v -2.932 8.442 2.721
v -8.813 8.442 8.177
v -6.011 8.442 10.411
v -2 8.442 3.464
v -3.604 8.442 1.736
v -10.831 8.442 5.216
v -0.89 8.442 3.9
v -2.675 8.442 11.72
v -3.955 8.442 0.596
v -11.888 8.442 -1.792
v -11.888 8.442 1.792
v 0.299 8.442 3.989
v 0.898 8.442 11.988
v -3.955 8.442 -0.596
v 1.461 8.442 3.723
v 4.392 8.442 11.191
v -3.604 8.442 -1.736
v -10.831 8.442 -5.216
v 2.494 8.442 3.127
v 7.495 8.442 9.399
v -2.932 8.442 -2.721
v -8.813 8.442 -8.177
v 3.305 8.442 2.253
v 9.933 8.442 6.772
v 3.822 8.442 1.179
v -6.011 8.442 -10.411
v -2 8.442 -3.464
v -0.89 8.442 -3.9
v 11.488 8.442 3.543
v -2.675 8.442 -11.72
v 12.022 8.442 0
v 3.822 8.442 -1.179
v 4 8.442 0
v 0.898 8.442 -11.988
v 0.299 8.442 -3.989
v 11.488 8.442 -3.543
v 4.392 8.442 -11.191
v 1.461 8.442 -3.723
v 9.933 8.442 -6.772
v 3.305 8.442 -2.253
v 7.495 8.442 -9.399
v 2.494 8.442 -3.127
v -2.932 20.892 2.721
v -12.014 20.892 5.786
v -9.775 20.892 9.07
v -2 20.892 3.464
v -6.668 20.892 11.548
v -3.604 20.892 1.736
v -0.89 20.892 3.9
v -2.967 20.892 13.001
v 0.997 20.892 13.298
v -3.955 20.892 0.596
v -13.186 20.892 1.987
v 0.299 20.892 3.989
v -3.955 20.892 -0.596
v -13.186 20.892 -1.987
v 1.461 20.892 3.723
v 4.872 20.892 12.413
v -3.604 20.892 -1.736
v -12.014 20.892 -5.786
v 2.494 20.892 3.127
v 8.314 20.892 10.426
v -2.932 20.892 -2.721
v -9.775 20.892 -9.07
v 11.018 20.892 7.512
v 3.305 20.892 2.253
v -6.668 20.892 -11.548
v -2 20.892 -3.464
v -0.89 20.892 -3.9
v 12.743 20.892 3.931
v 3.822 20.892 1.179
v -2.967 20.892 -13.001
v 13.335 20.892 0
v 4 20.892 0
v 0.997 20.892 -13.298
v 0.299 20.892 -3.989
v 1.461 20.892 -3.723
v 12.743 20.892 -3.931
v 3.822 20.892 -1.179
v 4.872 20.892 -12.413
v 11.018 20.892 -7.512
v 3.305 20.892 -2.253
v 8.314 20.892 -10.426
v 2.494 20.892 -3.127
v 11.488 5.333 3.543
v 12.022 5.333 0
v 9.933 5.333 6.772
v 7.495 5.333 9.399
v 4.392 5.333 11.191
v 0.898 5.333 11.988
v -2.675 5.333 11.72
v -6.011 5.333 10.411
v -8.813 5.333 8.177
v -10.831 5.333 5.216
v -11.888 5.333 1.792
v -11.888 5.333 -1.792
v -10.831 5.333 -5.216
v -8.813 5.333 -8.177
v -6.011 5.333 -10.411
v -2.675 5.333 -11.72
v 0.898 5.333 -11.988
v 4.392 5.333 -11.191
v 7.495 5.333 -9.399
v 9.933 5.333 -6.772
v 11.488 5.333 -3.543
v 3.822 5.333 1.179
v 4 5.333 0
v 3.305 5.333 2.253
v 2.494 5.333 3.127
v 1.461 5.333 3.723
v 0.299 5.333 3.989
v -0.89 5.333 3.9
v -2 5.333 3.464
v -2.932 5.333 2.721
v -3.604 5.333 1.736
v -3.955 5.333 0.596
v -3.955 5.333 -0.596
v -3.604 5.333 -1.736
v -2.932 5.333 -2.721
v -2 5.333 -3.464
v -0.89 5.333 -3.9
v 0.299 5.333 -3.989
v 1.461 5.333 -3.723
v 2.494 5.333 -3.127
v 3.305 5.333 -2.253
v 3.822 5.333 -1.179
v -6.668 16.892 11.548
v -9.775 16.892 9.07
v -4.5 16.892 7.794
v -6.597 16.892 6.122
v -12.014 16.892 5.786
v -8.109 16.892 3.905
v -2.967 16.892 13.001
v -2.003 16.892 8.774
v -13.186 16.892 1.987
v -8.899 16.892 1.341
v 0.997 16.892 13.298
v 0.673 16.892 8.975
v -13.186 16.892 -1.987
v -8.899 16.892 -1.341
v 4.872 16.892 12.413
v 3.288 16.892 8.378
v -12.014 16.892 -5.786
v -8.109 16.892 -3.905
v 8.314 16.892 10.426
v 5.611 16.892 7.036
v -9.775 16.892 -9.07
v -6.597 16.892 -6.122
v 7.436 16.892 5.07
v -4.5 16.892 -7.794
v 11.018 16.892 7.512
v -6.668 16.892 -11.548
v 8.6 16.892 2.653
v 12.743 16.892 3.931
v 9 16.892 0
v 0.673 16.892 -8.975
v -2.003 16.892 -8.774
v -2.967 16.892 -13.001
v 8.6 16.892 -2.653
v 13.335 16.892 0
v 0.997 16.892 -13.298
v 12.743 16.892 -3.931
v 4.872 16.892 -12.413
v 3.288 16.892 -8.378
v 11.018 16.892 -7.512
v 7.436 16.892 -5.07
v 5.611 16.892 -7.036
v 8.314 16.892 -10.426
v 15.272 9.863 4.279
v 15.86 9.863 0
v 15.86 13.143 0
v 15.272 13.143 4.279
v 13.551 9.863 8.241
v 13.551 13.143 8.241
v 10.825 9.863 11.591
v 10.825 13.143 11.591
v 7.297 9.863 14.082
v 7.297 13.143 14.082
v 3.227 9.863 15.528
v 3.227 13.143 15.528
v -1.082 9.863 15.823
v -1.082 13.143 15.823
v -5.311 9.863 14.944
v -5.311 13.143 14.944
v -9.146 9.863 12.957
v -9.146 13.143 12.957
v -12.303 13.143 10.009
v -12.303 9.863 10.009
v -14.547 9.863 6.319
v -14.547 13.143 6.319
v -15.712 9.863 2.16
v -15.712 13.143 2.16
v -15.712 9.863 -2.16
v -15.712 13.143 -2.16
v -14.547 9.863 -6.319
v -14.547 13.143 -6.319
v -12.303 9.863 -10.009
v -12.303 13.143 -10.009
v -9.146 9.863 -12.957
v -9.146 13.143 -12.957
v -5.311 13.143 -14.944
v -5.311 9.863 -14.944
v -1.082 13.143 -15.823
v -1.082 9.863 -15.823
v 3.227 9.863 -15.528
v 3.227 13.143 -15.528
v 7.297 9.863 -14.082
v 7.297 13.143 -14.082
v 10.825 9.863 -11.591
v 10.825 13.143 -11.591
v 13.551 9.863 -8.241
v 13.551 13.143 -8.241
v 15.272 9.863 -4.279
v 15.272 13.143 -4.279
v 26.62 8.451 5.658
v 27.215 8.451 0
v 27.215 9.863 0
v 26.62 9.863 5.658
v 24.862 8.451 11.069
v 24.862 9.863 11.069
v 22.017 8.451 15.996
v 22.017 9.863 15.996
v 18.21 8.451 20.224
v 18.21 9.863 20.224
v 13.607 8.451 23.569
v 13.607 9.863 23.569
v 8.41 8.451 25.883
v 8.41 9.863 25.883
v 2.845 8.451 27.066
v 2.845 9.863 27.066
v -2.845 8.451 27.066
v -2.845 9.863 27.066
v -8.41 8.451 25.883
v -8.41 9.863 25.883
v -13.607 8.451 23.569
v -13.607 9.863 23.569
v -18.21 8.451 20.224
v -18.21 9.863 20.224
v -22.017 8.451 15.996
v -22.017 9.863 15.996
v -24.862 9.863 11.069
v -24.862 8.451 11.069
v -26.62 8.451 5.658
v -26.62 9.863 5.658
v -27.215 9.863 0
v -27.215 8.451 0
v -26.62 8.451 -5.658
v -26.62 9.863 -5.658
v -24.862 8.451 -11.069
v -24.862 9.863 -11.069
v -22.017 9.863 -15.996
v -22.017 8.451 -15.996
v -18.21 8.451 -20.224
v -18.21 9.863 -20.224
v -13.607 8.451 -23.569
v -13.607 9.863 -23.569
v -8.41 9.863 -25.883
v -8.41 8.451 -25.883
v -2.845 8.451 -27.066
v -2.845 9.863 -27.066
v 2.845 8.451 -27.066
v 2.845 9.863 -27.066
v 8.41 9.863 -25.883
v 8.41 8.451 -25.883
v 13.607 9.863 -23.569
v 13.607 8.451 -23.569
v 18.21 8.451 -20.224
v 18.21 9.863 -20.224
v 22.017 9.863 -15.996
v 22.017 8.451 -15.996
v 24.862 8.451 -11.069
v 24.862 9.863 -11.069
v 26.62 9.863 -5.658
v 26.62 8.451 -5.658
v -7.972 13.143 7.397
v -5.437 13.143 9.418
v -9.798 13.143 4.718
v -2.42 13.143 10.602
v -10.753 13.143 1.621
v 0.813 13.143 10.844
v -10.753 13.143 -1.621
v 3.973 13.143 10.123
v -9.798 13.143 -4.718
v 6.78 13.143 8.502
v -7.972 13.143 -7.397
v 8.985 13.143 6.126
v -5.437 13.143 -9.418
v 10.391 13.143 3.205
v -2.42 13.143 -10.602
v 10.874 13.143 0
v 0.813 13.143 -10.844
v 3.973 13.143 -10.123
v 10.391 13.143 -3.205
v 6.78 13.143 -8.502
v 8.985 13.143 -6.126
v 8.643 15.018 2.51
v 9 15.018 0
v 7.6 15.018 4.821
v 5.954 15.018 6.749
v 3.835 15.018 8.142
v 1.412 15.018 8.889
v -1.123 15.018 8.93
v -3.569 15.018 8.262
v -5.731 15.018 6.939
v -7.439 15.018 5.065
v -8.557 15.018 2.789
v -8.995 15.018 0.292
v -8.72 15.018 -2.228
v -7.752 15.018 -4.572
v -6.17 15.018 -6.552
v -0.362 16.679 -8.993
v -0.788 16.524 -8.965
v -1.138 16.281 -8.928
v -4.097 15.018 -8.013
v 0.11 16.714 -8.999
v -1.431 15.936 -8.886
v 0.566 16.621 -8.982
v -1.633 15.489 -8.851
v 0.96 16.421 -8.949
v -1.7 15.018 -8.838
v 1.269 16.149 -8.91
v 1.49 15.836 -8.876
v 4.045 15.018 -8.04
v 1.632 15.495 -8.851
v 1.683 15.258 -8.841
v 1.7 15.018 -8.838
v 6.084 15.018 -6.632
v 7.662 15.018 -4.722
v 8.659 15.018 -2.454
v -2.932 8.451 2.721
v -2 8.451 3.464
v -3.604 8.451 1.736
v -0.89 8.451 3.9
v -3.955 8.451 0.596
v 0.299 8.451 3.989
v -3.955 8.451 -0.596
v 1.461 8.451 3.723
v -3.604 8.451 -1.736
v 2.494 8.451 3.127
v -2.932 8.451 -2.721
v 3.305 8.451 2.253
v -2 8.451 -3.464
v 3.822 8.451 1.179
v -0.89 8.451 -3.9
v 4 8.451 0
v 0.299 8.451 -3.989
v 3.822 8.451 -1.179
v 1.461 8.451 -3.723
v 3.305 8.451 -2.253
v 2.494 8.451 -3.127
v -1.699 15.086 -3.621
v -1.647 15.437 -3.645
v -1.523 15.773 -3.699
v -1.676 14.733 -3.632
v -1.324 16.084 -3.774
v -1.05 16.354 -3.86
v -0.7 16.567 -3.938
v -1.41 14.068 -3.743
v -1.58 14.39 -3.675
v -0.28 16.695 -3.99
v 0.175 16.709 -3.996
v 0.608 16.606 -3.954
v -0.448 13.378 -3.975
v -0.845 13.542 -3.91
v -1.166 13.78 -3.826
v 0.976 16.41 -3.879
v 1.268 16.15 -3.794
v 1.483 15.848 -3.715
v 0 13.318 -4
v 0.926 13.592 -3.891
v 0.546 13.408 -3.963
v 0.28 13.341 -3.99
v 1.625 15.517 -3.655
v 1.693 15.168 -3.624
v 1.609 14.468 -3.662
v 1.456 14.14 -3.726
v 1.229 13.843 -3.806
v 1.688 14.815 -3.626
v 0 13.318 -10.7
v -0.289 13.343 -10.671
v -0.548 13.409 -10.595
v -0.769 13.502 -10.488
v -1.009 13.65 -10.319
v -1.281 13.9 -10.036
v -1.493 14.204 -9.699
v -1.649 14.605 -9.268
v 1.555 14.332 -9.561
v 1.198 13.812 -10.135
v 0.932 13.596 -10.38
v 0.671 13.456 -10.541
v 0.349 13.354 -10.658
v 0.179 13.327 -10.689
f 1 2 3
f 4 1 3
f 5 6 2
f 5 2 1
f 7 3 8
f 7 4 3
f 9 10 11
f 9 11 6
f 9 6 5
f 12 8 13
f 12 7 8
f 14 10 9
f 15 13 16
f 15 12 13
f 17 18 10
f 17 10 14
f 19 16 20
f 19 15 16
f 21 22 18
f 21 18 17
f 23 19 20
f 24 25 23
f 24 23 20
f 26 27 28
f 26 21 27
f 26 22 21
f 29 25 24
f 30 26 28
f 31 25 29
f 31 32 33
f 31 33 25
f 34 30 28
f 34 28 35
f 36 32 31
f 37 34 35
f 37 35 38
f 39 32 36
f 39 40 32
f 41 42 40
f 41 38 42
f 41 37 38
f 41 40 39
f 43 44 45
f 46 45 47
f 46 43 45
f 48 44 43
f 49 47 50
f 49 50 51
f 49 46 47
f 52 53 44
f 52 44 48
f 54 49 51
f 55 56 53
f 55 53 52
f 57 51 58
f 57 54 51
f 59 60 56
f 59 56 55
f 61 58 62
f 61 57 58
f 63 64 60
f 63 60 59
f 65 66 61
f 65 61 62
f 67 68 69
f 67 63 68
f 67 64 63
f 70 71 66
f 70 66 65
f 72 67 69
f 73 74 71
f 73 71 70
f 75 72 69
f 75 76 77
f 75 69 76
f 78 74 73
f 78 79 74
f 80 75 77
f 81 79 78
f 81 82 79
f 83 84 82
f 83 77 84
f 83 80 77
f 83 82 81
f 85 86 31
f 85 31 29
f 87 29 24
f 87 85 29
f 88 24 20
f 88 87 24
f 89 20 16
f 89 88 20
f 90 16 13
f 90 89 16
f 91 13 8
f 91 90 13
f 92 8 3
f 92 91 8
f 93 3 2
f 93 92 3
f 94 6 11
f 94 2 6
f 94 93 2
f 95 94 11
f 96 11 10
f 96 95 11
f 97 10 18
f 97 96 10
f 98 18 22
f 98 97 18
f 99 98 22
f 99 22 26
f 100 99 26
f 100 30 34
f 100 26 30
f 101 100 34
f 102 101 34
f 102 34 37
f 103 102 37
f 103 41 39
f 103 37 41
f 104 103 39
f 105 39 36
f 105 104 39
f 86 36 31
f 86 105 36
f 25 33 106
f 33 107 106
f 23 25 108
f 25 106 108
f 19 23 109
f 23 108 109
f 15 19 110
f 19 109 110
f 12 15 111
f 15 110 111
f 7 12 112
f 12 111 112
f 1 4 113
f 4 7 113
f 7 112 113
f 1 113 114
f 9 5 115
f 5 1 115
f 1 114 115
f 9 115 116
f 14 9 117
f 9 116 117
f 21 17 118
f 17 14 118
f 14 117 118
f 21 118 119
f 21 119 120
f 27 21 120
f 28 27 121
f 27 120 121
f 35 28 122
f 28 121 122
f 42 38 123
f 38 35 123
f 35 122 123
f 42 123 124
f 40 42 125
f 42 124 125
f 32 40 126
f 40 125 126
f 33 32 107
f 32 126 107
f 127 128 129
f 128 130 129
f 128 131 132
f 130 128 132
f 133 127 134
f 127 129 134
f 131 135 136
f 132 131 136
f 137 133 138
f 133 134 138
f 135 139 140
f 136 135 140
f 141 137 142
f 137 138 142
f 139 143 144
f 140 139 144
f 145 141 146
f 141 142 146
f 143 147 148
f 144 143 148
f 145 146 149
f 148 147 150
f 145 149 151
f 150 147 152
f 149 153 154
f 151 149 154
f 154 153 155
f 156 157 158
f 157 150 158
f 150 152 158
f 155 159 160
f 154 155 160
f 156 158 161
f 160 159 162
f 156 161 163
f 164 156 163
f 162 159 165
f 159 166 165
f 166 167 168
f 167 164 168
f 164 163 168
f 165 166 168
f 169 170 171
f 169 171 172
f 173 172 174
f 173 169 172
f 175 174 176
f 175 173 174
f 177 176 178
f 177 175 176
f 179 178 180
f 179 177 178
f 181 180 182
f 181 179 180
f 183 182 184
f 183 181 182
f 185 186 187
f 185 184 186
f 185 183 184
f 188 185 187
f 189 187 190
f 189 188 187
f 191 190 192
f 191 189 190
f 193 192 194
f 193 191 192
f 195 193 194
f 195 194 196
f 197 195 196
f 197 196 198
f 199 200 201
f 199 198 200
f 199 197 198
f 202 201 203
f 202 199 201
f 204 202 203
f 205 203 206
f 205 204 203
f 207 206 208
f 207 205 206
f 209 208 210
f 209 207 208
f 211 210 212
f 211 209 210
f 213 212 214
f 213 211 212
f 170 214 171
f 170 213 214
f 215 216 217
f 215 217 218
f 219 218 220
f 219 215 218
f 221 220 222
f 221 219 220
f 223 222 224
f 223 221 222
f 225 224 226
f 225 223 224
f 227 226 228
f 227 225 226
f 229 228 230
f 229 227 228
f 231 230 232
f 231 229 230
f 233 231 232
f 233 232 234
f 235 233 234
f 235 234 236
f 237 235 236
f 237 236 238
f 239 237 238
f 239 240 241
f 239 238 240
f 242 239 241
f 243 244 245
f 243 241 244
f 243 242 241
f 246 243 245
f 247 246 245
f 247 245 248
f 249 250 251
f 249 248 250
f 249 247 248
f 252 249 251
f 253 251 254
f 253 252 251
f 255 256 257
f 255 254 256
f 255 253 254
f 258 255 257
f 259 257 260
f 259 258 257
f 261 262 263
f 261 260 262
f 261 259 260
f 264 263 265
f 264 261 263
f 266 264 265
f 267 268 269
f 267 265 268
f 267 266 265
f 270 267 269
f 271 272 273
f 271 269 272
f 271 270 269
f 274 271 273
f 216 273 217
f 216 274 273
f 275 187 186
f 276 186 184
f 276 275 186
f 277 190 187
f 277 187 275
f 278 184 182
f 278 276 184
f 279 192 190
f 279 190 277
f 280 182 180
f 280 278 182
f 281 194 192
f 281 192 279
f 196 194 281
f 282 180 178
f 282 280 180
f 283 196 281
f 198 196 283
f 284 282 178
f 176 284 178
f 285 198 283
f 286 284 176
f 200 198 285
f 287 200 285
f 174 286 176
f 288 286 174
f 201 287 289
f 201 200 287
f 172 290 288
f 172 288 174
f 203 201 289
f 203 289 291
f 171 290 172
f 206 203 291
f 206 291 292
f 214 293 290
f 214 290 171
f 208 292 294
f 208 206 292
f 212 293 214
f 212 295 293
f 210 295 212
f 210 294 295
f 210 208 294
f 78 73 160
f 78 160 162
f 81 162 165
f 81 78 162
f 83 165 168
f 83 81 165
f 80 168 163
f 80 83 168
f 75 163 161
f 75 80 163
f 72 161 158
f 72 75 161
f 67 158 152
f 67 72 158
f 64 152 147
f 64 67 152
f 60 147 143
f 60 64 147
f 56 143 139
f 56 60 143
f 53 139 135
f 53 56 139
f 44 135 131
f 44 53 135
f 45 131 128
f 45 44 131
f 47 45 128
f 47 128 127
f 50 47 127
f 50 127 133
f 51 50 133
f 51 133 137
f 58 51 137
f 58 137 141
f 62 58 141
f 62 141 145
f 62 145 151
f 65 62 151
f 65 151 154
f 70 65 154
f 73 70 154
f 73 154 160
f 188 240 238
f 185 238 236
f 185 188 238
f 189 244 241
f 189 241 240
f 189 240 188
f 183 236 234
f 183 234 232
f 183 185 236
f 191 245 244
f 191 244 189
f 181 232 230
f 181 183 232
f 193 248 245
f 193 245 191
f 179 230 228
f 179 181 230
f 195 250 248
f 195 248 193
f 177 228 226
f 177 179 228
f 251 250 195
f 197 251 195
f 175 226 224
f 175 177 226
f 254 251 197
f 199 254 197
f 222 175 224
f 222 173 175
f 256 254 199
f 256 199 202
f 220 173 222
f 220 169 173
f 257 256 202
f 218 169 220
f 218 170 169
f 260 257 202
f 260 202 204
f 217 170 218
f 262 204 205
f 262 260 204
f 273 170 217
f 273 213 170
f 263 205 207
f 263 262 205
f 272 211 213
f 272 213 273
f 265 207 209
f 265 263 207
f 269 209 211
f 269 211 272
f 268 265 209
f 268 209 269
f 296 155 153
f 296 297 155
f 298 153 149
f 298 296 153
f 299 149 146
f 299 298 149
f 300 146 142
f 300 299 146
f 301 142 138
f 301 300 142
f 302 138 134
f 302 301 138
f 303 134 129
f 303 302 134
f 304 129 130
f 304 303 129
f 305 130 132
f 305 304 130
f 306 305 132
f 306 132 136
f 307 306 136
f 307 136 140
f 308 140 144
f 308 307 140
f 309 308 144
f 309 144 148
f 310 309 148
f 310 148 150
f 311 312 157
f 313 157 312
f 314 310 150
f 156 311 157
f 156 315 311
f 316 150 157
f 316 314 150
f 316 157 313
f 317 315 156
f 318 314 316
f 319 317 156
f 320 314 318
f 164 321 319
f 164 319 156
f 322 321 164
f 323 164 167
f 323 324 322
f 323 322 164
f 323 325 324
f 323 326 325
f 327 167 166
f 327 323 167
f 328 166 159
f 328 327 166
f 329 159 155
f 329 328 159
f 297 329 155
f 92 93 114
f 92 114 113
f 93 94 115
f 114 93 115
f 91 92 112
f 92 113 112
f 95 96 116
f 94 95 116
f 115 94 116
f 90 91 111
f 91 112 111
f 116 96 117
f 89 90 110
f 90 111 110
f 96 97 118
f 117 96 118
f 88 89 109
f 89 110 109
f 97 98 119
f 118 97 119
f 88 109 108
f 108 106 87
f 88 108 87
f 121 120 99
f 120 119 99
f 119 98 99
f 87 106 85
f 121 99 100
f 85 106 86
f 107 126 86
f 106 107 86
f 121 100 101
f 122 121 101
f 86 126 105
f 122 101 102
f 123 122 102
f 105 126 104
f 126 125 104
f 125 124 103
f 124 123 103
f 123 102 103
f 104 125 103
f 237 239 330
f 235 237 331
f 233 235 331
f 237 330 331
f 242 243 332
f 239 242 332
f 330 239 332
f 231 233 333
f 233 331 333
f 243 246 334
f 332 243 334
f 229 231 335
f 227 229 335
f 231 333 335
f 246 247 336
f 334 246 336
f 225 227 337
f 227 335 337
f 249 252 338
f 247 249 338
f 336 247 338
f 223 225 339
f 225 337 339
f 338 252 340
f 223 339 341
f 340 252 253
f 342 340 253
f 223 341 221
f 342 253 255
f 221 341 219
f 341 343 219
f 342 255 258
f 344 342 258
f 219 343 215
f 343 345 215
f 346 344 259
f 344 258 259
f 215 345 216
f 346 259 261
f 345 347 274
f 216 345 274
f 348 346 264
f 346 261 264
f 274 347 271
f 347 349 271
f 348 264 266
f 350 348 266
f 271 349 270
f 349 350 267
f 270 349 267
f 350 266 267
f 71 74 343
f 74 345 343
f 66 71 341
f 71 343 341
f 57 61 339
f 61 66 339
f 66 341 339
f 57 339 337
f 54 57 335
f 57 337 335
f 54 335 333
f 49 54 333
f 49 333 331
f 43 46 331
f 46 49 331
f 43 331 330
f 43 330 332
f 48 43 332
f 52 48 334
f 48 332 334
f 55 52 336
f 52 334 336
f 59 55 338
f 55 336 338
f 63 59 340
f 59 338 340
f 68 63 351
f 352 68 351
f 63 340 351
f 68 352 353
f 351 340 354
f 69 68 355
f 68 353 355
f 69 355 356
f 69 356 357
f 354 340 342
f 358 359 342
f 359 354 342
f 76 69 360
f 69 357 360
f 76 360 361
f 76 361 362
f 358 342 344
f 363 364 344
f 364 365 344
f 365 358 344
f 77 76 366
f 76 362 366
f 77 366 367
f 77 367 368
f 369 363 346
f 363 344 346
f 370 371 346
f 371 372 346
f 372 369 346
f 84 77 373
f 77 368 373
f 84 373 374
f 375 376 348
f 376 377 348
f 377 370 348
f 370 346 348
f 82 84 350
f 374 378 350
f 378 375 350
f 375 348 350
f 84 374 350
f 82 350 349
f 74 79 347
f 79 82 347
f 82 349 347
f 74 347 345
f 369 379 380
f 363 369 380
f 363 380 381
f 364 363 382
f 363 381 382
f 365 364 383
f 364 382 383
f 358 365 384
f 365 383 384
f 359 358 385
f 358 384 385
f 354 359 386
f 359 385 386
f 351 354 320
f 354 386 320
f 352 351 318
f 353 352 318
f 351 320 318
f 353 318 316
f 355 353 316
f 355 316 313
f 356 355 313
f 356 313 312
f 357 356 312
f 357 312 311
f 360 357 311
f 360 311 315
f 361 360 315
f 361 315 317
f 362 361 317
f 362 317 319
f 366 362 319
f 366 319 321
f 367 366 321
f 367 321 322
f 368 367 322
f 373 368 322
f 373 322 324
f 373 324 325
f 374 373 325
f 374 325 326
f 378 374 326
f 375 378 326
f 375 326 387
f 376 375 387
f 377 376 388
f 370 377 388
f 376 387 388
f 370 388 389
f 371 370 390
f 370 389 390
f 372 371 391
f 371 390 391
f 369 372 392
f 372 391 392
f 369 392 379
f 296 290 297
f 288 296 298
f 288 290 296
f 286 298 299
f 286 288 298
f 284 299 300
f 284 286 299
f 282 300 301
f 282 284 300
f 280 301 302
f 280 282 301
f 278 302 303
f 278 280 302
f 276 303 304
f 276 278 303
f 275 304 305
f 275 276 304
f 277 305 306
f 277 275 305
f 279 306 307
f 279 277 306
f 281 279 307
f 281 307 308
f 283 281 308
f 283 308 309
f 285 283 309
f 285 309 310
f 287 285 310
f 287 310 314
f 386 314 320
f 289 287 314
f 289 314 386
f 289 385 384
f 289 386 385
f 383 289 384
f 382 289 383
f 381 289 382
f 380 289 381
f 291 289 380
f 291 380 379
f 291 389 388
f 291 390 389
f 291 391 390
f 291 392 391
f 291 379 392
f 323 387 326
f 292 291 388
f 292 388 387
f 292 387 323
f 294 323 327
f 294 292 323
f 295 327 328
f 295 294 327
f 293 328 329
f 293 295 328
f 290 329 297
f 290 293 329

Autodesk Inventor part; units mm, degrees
ref_plane "YZ Plane" through (0, 0, 0) normal (1, 0, 0) x (0, 1, 0)
ref_plane "XZ Plane" through (0, 0, 0) normal (0, 1, 0) x (-1, 0, 0)
ref_plane "XY Plane" through (0, 0, 0) normal (0, 0, 1) x (1, 0, 0)
sketch "Sketch2" plane through (0, 0, 0) normal (0, 0, 1) x (1, 0, 0)
  line L0 (-13.335, 16.8924) -> (13.335, 16.8924) construction
  line L1 (13.335, 16.8924) -> (13.335, 20.8924)
  line L2 (13.335, 20.8924) -> (-13.335, 20.8924) construction
  line L3 (-13.335, 20.8924) -> (-13.335, 16.8924)
  line L4 (-13.335, 16.8924) -> (13.335, 20.8924) construction
  line L5 (13.335, 16.8924) -> (-13.335, 20.8924) construction
  line L6 (0, -12.1762) -> (0, 12.1762) construction
  line L7 (-9, 16.8924) -> (9, 16.8924) construction
  line L8 (9, 16.8924) -> (9, 20.8924)
  line L9 (9, 20.8924) -> (-9, 20.8924) construction
  line L10 (-9, 20.8924) -> (-9, 16.8924)
  line L11 (-9, 16.8924) -> (9, 20.8924) construction
  line L12 (9, 16.8924) -> (-9, 20.8924) construction
  line L13 (31.2915, 53.5117) -> (31.2915, -42.8656) construction
  line L14 (31.2915, -42.8656) -> (-90.5187, -42.8656) construction
  line L15 (-90.5187, -42.8656) -> (-90.5187, 53.5117) construction
  line L16 (-90.5187, 53.5117) -> (31.2915, 53.5117) construction
  line L17 (15.8601, 8.4424) -> (-15.8601, 8.4424)
  line L18 (-15.8601, 8.4424) -> (-15.8601, 13.1433)
  line L19 (-15.8601, 13.1433) -> (15.8601, 13.1433)
  line L20 (15.8601, 13.1433) -> (15.8601, 8.4424)
  line L21 (15.8601, 8.4424) -> (-15.8601, 13.1433) construction
  line L22 (-15.8601, 8.4424) -> (15.8601, 13.1433) construction
  line L23 (27.2146, 8.4512) -> (-27.2146, 8.4512)
  line L24 (-27.2146, 8.4512) -> (-27.2146, 9.8628)
  line L25 (-27.2146, 9.8628) -> (27.2146, 9.8628)
  line L26 (27.2146, 9.8628) -> (27.2146, 8.4512)
  line L27 (27.2146, 8.4512) -> (-27.2146, 9.8628) construction
  line L28 (-27.2146, 8.4512) -> (27.2146, 9.8628) construction
  line L29 (12.0218, 5.3333) -> (-12.0218, 5.3333)
  line L30 (-12.0218, 5.3333) -> (-12.0218, 8.8452)
  line L31 (-12.0218, 8.8452) -> (12.0218, 8.8452)
  line L32 (12.0218, 8.8452) -> (12.0218, 5.3333)
  line L33 (12.0218, 5.3333) -> (-12.0218, 8.8452) construction
  line L34 (-12.0218, 5.3333) -> (12.0218, 8.8452) construction
  line L35 (-9, 16.8924) -> (-9, 13.1433)
  line L36 (-9, 15.0178) -> (-10.8745, 13.1433)
  line L37 (9, 16.8924) -> (9, 13.1433)
  line L38 (9, 15.0178) -> (10.8745, 13.1433)
  line L39 (-13.335, 20.8924) -> (13.335, 20.8924)
  line L40 (4, 3.8577) -> (-4, 3.8577) construction
  line L41 (-4, 3.8577) -> (-4, 22.4289)
  line L42 (-4, 22.4289) -> (4, 22.4289) construction
  line L43 (4, 22.4289) -> (4, 3.8577)
  line L44 (4, 3.8577) -> (-4, 22.4289) construction
  line L45 (-4, 3.8577) -> (4, 22.4289) construction
  line L46 (-13.335, 16.8924) -> (13.335, 16.8924)
  point P0 (0, 0)
  point P1 (0, 18.8924)
  point P2 (0, 0)
  point P3 (0, 10.7928)
  point P4 (0, 9.157)
  point P5 (0, 7.0892)
  point P6 (0, 13.1433)
  point P7 (4, 8.4424)
  point P8 (4, 5.3333)
  point P9 (12.0218, 8.4424)
  point P10 (4, 20.8924)
  point P11 (4, 8.4512)
  point P12 (15.8601, 9.8628)
  dimension "d0" = 26.67
  dimension "d1" = 18
  dimension "d32" = 45
  dimension "d33" = 45
  dimension "d36" = 8
  dimension "d44" = 4
revolve "Revolution1" add sketch "Sketch2" angle 360 about axis through (0, -12.1762, 0) along (0, 1, 0) contours L46 L8 L39 L1 | L46 L43 L39 L8 | L37 L19 L43 L46 | L38 L19 L37 | L19 L20 L25 L43 | L25 L20 L23 L32 L31 L43 | L25 L26 L23 L20 | L31 L32 L23 L43 | L17 L32 L29 L43
sketch "Sketch3" plane through (0, 0, 0) normal (0, 0, 1) x (1, 0, 0)
  line L0 (9, 15.0178) -> (-9, 15.0178) projected
  point P0 (0, 0)
  point P1 (0, 15.0178)
hole "Hole1" at (0, 15.0178, 0) direction (0, 0, -1) diameter 3.4 end through all clearance for "Hex Head Cap Screw ISO 24017" size "M3" standard "ISO"
properties part number "encoder wheel"
